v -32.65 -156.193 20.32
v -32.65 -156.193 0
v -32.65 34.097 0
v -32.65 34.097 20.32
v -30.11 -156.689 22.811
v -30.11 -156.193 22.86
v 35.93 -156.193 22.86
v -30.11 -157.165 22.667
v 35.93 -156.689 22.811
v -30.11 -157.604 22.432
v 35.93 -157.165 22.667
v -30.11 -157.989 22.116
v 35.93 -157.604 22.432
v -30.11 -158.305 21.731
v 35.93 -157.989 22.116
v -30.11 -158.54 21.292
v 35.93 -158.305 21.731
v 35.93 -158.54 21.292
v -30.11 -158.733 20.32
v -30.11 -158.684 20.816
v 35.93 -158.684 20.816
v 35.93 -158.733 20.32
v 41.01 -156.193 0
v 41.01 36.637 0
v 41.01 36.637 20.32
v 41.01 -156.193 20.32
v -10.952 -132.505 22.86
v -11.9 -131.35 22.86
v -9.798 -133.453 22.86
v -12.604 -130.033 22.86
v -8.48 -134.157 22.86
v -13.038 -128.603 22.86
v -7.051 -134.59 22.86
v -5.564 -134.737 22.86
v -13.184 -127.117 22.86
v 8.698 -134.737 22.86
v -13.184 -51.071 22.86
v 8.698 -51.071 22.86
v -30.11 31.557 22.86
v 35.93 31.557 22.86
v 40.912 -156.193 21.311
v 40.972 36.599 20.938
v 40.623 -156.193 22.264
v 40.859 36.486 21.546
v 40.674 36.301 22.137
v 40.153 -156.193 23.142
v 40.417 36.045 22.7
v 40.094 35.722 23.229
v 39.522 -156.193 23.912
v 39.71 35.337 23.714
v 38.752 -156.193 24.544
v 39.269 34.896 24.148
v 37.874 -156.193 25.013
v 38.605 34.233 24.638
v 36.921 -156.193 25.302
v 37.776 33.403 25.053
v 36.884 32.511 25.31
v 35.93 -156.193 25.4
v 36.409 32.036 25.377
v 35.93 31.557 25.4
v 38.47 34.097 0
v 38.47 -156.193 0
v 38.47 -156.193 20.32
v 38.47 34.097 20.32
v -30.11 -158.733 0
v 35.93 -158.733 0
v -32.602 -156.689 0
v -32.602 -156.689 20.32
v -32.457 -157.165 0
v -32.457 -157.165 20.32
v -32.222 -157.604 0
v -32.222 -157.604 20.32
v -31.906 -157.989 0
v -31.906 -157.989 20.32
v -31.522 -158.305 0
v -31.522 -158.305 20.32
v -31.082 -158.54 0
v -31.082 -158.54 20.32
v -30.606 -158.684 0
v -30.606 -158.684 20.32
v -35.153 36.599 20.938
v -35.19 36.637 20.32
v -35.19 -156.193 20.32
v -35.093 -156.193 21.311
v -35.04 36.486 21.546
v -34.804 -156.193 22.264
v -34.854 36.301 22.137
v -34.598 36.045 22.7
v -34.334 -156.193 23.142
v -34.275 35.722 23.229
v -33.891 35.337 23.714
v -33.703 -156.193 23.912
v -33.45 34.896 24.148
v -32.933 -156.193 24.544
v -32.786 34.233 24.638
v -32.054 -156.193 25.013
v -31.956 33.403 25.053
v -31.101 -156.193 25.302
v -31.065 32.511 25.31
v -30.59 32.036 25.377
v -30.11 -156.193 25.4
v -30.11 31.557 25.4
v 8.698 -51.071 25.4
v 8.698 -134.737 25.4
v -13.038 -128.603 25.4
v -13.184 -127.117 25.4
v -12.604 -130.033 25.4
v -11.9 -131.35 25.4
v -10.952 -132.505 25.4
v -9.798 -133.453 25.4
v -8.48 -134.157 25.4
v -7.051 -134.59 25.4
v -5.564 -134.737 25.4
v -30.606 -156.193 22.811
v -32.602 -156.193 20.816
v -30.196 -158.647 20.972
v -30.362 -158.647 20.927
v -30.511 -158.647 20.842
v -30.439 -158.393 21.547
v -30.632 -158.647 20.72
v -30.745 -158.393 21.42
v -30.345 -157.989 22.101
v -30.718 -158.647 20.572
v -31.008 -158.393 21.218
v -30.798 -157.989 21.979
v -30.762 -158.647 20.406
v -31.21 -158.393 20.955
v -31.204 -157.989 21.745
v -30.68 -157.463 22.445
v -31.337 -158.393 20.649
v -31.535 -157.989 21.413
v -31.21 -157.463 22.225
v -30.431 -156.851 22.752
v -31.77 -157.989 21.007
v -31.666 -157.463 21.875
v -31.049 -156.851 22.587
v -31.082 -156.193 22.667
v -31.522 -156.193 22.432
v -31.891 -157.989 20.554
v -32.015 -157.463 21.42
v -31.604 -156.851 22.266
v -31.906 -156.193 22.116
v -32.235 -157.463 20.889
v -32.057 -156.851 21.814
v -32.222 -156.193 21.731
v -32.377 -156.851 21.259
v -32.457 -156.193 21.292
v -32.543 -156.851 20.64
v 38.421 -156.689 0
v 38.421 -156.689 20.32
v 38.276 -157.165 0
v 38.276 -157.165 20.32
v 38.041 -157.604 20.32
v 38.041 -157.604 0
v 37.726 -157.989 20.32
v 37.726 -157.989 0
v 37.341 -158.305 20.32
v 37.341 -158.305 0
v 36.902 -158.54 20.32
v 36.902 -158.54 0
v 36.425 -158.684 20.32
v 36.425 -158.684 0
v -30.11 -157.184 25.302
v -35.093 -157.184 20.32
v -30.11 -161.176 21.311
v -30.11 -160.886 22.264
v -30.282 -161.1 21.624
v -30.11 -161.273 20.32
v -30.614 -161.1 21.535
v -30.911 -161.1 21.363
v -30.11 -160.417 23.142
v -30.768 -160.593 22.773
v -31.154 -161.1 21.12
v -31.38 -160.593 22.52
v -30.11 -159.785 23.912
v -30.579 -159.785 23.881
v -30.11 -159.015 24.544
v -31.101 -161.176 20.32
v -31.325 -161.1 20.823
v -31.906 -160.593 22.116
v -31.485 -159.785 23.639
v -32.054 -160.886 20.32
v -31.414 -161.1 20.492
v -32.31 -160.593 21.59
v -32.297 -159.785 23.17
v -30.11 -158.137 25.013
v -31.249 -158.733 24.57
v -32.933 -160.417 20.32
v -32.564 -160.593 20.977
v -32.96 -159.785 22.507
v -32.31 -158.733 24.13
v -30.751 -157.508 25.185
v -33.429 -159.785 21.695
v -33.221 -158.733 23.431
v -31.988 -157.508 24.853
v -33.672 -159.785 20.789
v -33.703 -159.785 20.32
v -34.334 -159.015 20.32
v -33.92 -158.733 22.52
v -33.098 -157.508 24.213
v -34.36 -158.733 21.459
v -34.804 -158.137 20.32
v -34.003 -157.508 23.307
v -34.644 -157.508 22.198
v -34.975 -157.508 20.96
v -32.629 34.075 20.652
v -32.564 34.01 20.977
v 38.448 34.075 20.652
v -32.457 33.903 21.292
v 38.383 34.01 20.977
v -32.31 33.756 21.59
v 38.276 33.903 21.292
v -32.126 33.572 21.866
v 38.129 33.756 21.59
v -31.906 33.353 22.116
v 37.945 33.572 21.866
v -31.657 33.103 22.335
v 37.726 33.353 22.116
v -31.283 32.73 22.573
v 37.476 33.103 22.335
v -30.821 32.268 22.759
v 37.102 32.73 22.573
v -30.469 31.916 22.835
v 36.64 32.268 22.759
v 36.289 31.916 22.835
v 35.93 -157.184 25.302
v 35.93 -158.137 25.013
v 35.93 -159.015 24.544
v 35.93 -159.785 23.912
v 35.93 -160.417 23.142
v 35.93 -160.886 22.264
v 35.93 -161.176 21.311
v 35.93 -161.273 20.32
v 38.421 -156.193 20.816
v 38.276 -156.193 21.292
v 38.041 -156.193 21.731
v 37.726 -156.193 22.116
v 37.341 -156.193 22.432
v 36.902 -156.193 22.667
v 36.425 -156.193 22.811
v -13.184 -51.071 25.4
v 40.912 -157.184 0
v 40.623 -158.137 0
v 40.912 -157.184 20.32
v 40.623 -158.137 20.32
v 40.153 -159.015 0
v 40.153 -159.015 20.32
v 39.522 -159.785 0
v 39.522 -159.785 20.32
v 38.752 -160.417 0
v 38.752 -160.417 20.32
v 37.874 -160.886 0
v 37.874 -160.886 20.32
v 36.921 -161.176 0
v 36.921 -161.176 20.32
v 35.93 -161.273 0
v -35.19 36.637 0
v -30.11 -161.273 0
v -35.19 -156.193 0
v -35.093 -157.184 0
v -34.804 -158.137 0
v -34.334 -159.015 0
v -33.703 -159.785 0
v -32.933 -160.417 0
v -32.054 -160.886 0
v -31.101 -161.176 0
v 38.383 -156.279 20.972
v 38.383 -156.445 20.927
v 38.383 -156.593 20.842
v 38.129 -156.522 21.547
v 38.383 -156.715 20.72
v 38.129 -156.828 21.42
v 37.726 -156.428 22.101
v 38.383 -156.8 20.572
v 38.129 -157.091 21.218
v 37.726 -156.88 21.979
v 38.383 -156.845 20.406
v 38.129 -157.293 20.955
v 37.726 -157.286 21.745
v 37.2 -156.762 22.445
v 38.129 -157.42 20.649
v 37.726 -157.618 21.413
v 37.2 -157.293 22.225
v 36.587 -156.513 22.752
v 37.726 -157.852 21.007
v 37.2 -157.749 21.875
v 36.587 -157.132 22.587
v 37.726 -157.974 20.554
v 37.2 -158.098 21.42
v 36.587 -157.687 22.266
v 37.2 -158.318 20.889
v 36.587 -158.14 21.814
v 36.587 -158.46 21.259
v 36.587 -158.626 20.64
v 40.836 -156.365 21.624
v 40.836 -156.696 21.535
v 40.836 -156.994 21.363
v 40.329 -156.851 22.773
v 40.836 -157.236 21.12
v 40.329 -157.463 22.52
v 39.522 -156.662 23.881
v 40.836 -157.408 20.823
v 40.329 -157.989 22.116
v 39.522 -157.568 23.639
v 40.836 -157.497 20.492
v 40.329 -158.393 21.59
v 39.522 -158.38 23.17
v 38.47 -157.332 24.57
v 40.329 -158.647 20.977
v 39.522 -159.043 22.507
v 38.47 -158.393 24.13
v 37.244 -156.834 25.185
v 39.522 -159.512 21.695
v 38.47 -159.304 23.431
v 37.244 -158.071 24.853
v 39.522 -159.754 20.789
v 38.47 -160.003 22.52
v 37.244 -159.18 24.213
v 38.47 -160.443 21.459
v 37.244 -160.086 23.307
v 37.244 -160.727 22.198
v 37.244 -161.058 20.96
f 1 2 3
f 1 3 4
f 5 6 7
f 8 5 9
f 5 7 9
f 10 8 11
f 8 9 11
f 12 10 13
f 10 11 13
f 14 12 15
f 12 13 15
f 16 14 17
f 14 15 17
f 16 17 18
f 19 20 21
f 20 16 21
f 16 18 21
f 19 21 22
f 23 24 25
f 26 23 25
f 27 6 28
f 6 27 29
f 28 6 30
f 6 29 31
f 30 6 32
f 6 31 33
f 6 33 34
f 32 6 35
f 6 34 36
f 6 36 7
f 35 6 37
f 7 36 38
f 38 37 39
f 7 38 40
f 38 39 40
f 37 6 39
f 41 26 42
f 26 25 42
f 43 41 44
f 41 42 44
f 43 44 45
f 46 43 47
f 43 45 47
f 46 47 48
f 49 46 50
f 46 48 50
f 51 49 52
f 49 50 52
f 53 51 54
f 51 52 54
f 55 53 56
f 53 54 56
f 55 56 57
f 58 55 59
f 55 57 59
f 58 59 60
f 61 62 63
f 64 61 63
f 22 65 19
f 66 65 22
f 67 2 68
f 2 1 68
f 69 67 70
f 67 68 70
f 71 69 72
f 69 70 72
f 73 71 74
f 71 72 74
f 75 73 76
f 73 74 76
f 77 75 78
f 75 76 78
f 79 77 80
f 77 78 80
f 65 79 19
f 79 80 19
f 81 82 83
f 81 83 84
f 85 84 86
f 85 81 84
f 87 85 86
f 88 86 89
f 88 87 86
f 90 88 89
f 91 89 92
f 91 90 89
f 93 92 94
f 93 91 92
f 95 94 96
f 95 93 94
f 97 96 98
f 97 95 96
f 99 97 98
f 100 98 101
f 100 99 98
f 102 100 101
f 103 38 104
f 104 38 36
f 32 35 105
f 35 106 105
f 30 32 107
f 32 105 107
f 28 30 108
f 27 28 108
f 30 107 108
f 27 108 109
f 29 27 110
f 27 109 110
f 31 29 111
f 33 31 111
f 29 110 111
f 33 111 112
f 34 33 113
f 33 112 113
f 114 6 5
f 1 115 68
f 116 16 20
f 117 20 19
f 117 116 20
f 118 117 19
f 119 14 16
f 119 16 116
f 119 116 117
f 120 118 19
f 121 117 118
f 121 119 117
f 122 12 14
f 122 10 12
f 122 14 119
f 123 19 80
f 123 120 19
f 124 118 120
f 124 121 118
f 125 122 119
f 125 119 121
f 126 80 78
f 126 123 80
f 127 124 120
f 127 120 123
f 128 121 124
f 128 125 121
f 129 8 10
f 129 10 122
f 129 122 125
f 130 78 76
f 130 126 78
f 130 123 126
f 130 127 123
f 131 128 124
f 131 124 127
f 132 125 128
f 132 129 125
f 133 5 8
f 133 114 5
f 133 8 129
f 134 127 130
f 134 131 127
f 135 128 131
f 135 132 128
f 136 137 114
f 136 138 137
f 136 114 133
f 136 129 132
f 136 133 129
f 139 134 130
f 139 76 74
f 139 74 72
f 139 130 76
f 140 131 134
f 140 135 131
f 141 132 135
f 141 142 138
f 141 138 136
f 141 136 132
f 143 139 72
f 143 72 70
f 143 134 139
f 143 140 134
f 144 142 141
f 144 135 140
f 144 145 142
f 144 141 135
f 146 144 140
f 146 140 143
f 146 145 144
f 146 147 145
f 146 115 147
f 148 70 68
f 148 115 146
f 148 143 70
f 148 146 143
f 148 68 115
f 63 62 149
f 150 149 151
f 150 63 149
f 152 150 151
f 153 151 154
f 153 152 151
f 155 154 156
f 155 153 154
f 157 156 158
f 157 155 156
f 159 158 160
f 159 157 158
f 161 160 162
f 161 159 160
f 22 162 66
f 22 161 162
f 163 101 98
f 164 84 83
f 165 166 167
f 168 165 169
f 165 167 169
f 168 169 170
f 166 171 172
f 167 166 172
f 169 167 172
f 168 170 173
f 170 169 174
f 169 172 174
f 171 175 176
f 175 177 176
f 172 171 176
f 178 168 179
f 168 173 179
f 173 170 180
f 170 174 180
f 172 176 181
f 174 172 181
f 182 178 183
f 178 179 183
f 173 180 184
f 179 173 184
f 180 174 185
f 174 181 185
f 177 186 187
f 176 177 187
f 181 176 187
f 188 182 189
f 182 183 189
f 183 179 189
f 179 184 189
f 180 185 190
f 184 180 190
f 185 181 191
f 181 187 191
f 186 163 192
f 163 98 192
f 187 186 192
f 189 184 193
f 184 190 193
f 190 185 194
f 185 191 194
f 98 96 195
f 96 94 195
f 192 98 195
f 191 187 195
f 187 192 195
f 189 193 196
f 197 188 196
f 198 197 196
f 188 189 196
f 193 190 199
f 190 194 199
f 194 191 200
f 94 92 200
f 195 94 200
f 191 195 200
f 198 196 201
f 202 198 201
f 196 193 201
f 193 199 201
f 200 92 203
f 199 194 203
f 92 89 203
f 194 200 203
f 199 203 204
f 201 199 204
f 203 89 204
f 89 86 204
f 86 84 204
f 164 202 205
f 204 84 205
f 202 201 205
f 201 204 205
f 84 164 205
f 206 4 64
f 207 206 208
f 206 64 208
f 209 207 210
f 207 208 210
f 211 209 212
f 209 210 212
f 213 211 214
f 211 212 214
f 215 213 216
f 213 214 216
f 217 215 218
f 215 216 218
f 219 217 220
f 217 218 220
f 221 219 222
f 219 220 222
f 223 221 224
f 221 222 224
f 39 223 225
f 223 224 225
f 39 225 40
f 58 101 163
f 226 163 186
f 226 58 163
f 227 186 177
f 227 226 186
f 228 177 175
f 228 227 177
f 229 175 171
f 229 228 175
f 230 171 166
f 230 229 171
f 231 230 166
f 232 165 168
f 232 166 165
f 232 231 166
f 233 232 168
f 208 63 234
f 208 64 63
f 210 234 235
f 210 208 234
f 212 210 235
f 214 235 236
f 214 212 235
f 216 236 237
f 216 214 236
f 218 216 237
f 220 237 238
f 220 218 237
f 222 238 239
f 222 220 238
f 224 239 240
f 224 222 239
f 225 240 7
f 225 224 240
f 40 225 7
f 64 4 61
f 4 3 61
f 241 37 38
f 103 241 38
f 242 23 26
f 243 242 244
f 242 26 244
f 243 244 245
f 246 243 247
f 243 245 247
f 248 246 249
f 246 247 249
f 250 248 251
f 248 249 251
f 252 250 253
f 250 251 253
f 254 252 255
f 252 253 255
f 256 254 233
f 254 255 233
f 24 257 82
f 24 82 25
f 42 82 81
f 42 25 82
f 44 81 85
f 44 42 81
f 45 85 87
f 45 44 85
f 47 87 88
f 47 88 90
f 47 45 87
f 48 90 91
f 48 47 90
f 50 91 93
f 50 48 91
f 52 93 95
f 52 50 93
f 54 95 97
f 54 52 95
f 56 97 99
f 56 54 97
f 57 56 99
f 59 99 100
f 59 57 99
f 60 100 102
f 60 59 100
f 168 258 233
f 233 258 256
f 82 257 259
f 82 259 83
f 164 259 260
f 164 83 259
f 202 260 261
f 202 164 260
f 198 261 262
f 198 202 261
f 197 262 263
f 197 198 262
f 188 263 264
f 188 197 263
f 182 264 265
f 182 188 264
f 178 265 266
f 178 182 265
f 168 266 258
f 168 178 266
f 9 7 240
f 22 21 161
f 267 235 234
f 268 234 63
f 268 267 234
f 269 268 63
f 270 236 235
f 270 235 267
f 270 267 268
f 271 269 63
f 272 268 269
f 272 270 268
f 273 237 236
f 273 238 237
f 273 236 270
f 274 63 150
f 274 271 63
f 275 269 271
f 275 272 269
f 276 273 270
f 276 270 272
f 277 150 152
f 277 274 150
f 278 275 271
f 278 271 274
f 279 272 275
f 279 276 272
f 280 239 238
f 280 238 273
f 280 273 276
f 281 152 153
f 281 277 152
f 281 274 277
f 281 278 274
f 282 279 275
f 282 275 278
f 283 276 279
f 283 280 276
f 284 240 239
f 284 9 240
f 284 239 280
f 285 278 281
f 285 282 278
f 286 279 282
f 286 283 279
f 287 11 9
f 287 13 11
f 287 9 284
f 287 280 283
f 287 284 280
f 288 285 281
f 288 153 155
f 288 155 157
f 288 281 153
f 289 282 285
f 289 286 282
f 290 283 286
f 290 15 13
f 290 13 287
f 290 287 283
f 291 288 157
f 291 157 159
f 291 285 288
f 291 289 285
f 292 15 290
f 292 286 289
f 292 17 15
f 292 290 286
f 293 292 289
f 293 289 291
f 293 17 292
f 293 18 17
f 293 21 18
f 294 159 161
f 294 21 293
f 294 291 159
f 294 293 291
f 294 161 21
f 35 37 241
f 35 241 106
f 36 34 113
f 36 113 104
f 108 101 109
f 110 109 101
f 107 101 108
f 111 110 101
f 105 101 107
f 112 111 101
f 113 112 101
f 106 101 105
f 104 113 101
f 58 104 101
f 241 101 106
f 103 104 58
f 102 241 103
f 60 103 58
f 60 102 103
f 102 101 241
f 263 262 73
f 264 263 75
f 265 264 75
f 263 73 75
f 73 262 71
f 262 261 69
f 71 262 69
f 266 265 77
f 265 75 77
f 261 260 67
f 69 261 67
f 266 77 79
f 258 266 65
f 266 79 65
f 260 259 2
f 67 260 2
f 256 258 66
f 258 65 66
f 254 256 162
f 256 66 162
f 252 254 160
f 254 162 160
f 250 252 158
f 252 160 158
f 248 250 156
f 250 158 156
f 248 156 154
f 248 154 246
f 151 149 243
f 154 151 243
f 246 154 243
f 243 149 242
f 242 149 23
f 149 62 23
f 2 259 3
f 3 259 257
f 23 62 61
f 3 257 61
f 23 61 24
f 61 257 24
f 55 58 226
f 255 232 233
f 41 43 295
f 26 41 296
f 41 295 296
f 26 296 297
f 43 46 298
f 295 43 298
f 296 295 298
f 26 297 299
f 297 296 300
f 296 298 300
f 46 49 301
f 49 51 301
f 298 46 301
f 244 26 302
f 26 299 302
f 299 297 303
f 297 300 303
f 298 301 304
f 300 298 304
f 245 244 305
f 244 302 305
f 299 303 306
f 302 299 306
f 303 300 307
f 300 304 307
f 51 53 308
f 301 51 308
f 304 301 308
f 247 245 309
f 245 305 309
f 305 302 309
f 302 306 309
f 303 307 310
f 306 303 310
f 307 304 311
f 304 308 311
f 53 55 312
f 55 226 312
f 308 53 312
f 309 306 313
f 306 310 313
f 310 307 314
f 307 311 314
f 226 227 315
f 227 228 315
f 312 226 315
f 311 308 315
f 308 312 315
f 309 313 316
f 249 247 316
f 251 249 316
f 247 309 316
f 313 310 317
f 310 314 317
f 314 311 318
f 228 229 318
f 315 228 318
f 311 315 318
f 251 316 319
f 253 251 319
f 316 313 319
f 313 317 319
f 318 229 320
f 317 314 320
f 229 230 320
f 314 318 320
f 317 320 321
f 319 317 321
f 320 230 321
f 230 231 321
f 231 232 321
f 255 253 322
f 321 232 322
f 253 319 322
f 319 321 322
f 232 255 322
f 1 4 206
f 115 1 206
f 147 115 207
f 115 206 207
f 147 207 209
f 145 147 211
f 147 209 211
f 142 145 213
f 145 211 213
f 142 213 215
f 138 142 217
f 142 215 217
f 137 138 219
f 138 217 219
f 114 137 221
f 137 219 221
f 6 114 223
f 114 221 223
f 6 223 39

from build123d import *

# Parameters (mm, degrees)
F0_W     = 76.2
F0_H     = 70.9098950028
F1_DEPTH = 25.4
F2_DEPTH = 127
F3_R     = 5.08
F5_T     = -2.54
F4_W     = 21.8821829185
F4_H     = 83.6660973728
F6_DEPTH = 25.4
F7_R     = 7.62


with BuildPart() as f1:
    # F0 (on Top) → F1 (new body)
    with BuildSketch(Plane.XY):
        with Locations((2.9095611587, 1.1818297207)):
            Rectangle(F0_W, F0_H)
    extrude(amount=F1_DEPTH)

    # F2 (add): a face of the model
    f2_faces = [f1.faces().sort_by_distance(p)[0] for p in [
        (2.9095611587, -34.2731177807, 12.7),
    ]]
    extrude(f2_faces, amount=F2_DEPTH)

    # F3
    f3_edges = [f1.edges().sort_by_distance(p)[0] for p in [
        (2.909561, 36.636777, 25.4),
        (-35.190439, -62.31817, 25.4),
        (2.909561, -161.273118, 25.4),
        (41.009561, -62.31817, 25.4),
        (41.009561, -161.273118, 12.7),
        (-35.190439, -161.273118, 12.7),
    ]]
    fillet(f3_edges, radius=F3_R)

    # F5
    f5_openings = [f1.faces().sort_by_distance(p)[0] for p in [
        (2.909561, -62.246272, 0),
    ]]
    offset(amount=F5_T, openings=f5_openings)

    # F4 (on face) → F6 (cut)
    with BuildSketch(Plane(origin=(0, 0, 0), x_dir=(1, 0, 0), z_dir=(0, 0, -1))):
        with Locations((-2.2429865785, 92.903772369)):
            Rectangle(F4_W, F4_H)
    extrude(amount=-F6_DEPTH, mode=Mode.SUBTRACT)

    # F7
    f7_edges = [f1.edges().sort_by_distance(p)[0] for p in [
        (-13.184078, -134.736821, 24.13),
    ]]
    fillet(f7_edges, radius=F7_R)


solid = f1.part
